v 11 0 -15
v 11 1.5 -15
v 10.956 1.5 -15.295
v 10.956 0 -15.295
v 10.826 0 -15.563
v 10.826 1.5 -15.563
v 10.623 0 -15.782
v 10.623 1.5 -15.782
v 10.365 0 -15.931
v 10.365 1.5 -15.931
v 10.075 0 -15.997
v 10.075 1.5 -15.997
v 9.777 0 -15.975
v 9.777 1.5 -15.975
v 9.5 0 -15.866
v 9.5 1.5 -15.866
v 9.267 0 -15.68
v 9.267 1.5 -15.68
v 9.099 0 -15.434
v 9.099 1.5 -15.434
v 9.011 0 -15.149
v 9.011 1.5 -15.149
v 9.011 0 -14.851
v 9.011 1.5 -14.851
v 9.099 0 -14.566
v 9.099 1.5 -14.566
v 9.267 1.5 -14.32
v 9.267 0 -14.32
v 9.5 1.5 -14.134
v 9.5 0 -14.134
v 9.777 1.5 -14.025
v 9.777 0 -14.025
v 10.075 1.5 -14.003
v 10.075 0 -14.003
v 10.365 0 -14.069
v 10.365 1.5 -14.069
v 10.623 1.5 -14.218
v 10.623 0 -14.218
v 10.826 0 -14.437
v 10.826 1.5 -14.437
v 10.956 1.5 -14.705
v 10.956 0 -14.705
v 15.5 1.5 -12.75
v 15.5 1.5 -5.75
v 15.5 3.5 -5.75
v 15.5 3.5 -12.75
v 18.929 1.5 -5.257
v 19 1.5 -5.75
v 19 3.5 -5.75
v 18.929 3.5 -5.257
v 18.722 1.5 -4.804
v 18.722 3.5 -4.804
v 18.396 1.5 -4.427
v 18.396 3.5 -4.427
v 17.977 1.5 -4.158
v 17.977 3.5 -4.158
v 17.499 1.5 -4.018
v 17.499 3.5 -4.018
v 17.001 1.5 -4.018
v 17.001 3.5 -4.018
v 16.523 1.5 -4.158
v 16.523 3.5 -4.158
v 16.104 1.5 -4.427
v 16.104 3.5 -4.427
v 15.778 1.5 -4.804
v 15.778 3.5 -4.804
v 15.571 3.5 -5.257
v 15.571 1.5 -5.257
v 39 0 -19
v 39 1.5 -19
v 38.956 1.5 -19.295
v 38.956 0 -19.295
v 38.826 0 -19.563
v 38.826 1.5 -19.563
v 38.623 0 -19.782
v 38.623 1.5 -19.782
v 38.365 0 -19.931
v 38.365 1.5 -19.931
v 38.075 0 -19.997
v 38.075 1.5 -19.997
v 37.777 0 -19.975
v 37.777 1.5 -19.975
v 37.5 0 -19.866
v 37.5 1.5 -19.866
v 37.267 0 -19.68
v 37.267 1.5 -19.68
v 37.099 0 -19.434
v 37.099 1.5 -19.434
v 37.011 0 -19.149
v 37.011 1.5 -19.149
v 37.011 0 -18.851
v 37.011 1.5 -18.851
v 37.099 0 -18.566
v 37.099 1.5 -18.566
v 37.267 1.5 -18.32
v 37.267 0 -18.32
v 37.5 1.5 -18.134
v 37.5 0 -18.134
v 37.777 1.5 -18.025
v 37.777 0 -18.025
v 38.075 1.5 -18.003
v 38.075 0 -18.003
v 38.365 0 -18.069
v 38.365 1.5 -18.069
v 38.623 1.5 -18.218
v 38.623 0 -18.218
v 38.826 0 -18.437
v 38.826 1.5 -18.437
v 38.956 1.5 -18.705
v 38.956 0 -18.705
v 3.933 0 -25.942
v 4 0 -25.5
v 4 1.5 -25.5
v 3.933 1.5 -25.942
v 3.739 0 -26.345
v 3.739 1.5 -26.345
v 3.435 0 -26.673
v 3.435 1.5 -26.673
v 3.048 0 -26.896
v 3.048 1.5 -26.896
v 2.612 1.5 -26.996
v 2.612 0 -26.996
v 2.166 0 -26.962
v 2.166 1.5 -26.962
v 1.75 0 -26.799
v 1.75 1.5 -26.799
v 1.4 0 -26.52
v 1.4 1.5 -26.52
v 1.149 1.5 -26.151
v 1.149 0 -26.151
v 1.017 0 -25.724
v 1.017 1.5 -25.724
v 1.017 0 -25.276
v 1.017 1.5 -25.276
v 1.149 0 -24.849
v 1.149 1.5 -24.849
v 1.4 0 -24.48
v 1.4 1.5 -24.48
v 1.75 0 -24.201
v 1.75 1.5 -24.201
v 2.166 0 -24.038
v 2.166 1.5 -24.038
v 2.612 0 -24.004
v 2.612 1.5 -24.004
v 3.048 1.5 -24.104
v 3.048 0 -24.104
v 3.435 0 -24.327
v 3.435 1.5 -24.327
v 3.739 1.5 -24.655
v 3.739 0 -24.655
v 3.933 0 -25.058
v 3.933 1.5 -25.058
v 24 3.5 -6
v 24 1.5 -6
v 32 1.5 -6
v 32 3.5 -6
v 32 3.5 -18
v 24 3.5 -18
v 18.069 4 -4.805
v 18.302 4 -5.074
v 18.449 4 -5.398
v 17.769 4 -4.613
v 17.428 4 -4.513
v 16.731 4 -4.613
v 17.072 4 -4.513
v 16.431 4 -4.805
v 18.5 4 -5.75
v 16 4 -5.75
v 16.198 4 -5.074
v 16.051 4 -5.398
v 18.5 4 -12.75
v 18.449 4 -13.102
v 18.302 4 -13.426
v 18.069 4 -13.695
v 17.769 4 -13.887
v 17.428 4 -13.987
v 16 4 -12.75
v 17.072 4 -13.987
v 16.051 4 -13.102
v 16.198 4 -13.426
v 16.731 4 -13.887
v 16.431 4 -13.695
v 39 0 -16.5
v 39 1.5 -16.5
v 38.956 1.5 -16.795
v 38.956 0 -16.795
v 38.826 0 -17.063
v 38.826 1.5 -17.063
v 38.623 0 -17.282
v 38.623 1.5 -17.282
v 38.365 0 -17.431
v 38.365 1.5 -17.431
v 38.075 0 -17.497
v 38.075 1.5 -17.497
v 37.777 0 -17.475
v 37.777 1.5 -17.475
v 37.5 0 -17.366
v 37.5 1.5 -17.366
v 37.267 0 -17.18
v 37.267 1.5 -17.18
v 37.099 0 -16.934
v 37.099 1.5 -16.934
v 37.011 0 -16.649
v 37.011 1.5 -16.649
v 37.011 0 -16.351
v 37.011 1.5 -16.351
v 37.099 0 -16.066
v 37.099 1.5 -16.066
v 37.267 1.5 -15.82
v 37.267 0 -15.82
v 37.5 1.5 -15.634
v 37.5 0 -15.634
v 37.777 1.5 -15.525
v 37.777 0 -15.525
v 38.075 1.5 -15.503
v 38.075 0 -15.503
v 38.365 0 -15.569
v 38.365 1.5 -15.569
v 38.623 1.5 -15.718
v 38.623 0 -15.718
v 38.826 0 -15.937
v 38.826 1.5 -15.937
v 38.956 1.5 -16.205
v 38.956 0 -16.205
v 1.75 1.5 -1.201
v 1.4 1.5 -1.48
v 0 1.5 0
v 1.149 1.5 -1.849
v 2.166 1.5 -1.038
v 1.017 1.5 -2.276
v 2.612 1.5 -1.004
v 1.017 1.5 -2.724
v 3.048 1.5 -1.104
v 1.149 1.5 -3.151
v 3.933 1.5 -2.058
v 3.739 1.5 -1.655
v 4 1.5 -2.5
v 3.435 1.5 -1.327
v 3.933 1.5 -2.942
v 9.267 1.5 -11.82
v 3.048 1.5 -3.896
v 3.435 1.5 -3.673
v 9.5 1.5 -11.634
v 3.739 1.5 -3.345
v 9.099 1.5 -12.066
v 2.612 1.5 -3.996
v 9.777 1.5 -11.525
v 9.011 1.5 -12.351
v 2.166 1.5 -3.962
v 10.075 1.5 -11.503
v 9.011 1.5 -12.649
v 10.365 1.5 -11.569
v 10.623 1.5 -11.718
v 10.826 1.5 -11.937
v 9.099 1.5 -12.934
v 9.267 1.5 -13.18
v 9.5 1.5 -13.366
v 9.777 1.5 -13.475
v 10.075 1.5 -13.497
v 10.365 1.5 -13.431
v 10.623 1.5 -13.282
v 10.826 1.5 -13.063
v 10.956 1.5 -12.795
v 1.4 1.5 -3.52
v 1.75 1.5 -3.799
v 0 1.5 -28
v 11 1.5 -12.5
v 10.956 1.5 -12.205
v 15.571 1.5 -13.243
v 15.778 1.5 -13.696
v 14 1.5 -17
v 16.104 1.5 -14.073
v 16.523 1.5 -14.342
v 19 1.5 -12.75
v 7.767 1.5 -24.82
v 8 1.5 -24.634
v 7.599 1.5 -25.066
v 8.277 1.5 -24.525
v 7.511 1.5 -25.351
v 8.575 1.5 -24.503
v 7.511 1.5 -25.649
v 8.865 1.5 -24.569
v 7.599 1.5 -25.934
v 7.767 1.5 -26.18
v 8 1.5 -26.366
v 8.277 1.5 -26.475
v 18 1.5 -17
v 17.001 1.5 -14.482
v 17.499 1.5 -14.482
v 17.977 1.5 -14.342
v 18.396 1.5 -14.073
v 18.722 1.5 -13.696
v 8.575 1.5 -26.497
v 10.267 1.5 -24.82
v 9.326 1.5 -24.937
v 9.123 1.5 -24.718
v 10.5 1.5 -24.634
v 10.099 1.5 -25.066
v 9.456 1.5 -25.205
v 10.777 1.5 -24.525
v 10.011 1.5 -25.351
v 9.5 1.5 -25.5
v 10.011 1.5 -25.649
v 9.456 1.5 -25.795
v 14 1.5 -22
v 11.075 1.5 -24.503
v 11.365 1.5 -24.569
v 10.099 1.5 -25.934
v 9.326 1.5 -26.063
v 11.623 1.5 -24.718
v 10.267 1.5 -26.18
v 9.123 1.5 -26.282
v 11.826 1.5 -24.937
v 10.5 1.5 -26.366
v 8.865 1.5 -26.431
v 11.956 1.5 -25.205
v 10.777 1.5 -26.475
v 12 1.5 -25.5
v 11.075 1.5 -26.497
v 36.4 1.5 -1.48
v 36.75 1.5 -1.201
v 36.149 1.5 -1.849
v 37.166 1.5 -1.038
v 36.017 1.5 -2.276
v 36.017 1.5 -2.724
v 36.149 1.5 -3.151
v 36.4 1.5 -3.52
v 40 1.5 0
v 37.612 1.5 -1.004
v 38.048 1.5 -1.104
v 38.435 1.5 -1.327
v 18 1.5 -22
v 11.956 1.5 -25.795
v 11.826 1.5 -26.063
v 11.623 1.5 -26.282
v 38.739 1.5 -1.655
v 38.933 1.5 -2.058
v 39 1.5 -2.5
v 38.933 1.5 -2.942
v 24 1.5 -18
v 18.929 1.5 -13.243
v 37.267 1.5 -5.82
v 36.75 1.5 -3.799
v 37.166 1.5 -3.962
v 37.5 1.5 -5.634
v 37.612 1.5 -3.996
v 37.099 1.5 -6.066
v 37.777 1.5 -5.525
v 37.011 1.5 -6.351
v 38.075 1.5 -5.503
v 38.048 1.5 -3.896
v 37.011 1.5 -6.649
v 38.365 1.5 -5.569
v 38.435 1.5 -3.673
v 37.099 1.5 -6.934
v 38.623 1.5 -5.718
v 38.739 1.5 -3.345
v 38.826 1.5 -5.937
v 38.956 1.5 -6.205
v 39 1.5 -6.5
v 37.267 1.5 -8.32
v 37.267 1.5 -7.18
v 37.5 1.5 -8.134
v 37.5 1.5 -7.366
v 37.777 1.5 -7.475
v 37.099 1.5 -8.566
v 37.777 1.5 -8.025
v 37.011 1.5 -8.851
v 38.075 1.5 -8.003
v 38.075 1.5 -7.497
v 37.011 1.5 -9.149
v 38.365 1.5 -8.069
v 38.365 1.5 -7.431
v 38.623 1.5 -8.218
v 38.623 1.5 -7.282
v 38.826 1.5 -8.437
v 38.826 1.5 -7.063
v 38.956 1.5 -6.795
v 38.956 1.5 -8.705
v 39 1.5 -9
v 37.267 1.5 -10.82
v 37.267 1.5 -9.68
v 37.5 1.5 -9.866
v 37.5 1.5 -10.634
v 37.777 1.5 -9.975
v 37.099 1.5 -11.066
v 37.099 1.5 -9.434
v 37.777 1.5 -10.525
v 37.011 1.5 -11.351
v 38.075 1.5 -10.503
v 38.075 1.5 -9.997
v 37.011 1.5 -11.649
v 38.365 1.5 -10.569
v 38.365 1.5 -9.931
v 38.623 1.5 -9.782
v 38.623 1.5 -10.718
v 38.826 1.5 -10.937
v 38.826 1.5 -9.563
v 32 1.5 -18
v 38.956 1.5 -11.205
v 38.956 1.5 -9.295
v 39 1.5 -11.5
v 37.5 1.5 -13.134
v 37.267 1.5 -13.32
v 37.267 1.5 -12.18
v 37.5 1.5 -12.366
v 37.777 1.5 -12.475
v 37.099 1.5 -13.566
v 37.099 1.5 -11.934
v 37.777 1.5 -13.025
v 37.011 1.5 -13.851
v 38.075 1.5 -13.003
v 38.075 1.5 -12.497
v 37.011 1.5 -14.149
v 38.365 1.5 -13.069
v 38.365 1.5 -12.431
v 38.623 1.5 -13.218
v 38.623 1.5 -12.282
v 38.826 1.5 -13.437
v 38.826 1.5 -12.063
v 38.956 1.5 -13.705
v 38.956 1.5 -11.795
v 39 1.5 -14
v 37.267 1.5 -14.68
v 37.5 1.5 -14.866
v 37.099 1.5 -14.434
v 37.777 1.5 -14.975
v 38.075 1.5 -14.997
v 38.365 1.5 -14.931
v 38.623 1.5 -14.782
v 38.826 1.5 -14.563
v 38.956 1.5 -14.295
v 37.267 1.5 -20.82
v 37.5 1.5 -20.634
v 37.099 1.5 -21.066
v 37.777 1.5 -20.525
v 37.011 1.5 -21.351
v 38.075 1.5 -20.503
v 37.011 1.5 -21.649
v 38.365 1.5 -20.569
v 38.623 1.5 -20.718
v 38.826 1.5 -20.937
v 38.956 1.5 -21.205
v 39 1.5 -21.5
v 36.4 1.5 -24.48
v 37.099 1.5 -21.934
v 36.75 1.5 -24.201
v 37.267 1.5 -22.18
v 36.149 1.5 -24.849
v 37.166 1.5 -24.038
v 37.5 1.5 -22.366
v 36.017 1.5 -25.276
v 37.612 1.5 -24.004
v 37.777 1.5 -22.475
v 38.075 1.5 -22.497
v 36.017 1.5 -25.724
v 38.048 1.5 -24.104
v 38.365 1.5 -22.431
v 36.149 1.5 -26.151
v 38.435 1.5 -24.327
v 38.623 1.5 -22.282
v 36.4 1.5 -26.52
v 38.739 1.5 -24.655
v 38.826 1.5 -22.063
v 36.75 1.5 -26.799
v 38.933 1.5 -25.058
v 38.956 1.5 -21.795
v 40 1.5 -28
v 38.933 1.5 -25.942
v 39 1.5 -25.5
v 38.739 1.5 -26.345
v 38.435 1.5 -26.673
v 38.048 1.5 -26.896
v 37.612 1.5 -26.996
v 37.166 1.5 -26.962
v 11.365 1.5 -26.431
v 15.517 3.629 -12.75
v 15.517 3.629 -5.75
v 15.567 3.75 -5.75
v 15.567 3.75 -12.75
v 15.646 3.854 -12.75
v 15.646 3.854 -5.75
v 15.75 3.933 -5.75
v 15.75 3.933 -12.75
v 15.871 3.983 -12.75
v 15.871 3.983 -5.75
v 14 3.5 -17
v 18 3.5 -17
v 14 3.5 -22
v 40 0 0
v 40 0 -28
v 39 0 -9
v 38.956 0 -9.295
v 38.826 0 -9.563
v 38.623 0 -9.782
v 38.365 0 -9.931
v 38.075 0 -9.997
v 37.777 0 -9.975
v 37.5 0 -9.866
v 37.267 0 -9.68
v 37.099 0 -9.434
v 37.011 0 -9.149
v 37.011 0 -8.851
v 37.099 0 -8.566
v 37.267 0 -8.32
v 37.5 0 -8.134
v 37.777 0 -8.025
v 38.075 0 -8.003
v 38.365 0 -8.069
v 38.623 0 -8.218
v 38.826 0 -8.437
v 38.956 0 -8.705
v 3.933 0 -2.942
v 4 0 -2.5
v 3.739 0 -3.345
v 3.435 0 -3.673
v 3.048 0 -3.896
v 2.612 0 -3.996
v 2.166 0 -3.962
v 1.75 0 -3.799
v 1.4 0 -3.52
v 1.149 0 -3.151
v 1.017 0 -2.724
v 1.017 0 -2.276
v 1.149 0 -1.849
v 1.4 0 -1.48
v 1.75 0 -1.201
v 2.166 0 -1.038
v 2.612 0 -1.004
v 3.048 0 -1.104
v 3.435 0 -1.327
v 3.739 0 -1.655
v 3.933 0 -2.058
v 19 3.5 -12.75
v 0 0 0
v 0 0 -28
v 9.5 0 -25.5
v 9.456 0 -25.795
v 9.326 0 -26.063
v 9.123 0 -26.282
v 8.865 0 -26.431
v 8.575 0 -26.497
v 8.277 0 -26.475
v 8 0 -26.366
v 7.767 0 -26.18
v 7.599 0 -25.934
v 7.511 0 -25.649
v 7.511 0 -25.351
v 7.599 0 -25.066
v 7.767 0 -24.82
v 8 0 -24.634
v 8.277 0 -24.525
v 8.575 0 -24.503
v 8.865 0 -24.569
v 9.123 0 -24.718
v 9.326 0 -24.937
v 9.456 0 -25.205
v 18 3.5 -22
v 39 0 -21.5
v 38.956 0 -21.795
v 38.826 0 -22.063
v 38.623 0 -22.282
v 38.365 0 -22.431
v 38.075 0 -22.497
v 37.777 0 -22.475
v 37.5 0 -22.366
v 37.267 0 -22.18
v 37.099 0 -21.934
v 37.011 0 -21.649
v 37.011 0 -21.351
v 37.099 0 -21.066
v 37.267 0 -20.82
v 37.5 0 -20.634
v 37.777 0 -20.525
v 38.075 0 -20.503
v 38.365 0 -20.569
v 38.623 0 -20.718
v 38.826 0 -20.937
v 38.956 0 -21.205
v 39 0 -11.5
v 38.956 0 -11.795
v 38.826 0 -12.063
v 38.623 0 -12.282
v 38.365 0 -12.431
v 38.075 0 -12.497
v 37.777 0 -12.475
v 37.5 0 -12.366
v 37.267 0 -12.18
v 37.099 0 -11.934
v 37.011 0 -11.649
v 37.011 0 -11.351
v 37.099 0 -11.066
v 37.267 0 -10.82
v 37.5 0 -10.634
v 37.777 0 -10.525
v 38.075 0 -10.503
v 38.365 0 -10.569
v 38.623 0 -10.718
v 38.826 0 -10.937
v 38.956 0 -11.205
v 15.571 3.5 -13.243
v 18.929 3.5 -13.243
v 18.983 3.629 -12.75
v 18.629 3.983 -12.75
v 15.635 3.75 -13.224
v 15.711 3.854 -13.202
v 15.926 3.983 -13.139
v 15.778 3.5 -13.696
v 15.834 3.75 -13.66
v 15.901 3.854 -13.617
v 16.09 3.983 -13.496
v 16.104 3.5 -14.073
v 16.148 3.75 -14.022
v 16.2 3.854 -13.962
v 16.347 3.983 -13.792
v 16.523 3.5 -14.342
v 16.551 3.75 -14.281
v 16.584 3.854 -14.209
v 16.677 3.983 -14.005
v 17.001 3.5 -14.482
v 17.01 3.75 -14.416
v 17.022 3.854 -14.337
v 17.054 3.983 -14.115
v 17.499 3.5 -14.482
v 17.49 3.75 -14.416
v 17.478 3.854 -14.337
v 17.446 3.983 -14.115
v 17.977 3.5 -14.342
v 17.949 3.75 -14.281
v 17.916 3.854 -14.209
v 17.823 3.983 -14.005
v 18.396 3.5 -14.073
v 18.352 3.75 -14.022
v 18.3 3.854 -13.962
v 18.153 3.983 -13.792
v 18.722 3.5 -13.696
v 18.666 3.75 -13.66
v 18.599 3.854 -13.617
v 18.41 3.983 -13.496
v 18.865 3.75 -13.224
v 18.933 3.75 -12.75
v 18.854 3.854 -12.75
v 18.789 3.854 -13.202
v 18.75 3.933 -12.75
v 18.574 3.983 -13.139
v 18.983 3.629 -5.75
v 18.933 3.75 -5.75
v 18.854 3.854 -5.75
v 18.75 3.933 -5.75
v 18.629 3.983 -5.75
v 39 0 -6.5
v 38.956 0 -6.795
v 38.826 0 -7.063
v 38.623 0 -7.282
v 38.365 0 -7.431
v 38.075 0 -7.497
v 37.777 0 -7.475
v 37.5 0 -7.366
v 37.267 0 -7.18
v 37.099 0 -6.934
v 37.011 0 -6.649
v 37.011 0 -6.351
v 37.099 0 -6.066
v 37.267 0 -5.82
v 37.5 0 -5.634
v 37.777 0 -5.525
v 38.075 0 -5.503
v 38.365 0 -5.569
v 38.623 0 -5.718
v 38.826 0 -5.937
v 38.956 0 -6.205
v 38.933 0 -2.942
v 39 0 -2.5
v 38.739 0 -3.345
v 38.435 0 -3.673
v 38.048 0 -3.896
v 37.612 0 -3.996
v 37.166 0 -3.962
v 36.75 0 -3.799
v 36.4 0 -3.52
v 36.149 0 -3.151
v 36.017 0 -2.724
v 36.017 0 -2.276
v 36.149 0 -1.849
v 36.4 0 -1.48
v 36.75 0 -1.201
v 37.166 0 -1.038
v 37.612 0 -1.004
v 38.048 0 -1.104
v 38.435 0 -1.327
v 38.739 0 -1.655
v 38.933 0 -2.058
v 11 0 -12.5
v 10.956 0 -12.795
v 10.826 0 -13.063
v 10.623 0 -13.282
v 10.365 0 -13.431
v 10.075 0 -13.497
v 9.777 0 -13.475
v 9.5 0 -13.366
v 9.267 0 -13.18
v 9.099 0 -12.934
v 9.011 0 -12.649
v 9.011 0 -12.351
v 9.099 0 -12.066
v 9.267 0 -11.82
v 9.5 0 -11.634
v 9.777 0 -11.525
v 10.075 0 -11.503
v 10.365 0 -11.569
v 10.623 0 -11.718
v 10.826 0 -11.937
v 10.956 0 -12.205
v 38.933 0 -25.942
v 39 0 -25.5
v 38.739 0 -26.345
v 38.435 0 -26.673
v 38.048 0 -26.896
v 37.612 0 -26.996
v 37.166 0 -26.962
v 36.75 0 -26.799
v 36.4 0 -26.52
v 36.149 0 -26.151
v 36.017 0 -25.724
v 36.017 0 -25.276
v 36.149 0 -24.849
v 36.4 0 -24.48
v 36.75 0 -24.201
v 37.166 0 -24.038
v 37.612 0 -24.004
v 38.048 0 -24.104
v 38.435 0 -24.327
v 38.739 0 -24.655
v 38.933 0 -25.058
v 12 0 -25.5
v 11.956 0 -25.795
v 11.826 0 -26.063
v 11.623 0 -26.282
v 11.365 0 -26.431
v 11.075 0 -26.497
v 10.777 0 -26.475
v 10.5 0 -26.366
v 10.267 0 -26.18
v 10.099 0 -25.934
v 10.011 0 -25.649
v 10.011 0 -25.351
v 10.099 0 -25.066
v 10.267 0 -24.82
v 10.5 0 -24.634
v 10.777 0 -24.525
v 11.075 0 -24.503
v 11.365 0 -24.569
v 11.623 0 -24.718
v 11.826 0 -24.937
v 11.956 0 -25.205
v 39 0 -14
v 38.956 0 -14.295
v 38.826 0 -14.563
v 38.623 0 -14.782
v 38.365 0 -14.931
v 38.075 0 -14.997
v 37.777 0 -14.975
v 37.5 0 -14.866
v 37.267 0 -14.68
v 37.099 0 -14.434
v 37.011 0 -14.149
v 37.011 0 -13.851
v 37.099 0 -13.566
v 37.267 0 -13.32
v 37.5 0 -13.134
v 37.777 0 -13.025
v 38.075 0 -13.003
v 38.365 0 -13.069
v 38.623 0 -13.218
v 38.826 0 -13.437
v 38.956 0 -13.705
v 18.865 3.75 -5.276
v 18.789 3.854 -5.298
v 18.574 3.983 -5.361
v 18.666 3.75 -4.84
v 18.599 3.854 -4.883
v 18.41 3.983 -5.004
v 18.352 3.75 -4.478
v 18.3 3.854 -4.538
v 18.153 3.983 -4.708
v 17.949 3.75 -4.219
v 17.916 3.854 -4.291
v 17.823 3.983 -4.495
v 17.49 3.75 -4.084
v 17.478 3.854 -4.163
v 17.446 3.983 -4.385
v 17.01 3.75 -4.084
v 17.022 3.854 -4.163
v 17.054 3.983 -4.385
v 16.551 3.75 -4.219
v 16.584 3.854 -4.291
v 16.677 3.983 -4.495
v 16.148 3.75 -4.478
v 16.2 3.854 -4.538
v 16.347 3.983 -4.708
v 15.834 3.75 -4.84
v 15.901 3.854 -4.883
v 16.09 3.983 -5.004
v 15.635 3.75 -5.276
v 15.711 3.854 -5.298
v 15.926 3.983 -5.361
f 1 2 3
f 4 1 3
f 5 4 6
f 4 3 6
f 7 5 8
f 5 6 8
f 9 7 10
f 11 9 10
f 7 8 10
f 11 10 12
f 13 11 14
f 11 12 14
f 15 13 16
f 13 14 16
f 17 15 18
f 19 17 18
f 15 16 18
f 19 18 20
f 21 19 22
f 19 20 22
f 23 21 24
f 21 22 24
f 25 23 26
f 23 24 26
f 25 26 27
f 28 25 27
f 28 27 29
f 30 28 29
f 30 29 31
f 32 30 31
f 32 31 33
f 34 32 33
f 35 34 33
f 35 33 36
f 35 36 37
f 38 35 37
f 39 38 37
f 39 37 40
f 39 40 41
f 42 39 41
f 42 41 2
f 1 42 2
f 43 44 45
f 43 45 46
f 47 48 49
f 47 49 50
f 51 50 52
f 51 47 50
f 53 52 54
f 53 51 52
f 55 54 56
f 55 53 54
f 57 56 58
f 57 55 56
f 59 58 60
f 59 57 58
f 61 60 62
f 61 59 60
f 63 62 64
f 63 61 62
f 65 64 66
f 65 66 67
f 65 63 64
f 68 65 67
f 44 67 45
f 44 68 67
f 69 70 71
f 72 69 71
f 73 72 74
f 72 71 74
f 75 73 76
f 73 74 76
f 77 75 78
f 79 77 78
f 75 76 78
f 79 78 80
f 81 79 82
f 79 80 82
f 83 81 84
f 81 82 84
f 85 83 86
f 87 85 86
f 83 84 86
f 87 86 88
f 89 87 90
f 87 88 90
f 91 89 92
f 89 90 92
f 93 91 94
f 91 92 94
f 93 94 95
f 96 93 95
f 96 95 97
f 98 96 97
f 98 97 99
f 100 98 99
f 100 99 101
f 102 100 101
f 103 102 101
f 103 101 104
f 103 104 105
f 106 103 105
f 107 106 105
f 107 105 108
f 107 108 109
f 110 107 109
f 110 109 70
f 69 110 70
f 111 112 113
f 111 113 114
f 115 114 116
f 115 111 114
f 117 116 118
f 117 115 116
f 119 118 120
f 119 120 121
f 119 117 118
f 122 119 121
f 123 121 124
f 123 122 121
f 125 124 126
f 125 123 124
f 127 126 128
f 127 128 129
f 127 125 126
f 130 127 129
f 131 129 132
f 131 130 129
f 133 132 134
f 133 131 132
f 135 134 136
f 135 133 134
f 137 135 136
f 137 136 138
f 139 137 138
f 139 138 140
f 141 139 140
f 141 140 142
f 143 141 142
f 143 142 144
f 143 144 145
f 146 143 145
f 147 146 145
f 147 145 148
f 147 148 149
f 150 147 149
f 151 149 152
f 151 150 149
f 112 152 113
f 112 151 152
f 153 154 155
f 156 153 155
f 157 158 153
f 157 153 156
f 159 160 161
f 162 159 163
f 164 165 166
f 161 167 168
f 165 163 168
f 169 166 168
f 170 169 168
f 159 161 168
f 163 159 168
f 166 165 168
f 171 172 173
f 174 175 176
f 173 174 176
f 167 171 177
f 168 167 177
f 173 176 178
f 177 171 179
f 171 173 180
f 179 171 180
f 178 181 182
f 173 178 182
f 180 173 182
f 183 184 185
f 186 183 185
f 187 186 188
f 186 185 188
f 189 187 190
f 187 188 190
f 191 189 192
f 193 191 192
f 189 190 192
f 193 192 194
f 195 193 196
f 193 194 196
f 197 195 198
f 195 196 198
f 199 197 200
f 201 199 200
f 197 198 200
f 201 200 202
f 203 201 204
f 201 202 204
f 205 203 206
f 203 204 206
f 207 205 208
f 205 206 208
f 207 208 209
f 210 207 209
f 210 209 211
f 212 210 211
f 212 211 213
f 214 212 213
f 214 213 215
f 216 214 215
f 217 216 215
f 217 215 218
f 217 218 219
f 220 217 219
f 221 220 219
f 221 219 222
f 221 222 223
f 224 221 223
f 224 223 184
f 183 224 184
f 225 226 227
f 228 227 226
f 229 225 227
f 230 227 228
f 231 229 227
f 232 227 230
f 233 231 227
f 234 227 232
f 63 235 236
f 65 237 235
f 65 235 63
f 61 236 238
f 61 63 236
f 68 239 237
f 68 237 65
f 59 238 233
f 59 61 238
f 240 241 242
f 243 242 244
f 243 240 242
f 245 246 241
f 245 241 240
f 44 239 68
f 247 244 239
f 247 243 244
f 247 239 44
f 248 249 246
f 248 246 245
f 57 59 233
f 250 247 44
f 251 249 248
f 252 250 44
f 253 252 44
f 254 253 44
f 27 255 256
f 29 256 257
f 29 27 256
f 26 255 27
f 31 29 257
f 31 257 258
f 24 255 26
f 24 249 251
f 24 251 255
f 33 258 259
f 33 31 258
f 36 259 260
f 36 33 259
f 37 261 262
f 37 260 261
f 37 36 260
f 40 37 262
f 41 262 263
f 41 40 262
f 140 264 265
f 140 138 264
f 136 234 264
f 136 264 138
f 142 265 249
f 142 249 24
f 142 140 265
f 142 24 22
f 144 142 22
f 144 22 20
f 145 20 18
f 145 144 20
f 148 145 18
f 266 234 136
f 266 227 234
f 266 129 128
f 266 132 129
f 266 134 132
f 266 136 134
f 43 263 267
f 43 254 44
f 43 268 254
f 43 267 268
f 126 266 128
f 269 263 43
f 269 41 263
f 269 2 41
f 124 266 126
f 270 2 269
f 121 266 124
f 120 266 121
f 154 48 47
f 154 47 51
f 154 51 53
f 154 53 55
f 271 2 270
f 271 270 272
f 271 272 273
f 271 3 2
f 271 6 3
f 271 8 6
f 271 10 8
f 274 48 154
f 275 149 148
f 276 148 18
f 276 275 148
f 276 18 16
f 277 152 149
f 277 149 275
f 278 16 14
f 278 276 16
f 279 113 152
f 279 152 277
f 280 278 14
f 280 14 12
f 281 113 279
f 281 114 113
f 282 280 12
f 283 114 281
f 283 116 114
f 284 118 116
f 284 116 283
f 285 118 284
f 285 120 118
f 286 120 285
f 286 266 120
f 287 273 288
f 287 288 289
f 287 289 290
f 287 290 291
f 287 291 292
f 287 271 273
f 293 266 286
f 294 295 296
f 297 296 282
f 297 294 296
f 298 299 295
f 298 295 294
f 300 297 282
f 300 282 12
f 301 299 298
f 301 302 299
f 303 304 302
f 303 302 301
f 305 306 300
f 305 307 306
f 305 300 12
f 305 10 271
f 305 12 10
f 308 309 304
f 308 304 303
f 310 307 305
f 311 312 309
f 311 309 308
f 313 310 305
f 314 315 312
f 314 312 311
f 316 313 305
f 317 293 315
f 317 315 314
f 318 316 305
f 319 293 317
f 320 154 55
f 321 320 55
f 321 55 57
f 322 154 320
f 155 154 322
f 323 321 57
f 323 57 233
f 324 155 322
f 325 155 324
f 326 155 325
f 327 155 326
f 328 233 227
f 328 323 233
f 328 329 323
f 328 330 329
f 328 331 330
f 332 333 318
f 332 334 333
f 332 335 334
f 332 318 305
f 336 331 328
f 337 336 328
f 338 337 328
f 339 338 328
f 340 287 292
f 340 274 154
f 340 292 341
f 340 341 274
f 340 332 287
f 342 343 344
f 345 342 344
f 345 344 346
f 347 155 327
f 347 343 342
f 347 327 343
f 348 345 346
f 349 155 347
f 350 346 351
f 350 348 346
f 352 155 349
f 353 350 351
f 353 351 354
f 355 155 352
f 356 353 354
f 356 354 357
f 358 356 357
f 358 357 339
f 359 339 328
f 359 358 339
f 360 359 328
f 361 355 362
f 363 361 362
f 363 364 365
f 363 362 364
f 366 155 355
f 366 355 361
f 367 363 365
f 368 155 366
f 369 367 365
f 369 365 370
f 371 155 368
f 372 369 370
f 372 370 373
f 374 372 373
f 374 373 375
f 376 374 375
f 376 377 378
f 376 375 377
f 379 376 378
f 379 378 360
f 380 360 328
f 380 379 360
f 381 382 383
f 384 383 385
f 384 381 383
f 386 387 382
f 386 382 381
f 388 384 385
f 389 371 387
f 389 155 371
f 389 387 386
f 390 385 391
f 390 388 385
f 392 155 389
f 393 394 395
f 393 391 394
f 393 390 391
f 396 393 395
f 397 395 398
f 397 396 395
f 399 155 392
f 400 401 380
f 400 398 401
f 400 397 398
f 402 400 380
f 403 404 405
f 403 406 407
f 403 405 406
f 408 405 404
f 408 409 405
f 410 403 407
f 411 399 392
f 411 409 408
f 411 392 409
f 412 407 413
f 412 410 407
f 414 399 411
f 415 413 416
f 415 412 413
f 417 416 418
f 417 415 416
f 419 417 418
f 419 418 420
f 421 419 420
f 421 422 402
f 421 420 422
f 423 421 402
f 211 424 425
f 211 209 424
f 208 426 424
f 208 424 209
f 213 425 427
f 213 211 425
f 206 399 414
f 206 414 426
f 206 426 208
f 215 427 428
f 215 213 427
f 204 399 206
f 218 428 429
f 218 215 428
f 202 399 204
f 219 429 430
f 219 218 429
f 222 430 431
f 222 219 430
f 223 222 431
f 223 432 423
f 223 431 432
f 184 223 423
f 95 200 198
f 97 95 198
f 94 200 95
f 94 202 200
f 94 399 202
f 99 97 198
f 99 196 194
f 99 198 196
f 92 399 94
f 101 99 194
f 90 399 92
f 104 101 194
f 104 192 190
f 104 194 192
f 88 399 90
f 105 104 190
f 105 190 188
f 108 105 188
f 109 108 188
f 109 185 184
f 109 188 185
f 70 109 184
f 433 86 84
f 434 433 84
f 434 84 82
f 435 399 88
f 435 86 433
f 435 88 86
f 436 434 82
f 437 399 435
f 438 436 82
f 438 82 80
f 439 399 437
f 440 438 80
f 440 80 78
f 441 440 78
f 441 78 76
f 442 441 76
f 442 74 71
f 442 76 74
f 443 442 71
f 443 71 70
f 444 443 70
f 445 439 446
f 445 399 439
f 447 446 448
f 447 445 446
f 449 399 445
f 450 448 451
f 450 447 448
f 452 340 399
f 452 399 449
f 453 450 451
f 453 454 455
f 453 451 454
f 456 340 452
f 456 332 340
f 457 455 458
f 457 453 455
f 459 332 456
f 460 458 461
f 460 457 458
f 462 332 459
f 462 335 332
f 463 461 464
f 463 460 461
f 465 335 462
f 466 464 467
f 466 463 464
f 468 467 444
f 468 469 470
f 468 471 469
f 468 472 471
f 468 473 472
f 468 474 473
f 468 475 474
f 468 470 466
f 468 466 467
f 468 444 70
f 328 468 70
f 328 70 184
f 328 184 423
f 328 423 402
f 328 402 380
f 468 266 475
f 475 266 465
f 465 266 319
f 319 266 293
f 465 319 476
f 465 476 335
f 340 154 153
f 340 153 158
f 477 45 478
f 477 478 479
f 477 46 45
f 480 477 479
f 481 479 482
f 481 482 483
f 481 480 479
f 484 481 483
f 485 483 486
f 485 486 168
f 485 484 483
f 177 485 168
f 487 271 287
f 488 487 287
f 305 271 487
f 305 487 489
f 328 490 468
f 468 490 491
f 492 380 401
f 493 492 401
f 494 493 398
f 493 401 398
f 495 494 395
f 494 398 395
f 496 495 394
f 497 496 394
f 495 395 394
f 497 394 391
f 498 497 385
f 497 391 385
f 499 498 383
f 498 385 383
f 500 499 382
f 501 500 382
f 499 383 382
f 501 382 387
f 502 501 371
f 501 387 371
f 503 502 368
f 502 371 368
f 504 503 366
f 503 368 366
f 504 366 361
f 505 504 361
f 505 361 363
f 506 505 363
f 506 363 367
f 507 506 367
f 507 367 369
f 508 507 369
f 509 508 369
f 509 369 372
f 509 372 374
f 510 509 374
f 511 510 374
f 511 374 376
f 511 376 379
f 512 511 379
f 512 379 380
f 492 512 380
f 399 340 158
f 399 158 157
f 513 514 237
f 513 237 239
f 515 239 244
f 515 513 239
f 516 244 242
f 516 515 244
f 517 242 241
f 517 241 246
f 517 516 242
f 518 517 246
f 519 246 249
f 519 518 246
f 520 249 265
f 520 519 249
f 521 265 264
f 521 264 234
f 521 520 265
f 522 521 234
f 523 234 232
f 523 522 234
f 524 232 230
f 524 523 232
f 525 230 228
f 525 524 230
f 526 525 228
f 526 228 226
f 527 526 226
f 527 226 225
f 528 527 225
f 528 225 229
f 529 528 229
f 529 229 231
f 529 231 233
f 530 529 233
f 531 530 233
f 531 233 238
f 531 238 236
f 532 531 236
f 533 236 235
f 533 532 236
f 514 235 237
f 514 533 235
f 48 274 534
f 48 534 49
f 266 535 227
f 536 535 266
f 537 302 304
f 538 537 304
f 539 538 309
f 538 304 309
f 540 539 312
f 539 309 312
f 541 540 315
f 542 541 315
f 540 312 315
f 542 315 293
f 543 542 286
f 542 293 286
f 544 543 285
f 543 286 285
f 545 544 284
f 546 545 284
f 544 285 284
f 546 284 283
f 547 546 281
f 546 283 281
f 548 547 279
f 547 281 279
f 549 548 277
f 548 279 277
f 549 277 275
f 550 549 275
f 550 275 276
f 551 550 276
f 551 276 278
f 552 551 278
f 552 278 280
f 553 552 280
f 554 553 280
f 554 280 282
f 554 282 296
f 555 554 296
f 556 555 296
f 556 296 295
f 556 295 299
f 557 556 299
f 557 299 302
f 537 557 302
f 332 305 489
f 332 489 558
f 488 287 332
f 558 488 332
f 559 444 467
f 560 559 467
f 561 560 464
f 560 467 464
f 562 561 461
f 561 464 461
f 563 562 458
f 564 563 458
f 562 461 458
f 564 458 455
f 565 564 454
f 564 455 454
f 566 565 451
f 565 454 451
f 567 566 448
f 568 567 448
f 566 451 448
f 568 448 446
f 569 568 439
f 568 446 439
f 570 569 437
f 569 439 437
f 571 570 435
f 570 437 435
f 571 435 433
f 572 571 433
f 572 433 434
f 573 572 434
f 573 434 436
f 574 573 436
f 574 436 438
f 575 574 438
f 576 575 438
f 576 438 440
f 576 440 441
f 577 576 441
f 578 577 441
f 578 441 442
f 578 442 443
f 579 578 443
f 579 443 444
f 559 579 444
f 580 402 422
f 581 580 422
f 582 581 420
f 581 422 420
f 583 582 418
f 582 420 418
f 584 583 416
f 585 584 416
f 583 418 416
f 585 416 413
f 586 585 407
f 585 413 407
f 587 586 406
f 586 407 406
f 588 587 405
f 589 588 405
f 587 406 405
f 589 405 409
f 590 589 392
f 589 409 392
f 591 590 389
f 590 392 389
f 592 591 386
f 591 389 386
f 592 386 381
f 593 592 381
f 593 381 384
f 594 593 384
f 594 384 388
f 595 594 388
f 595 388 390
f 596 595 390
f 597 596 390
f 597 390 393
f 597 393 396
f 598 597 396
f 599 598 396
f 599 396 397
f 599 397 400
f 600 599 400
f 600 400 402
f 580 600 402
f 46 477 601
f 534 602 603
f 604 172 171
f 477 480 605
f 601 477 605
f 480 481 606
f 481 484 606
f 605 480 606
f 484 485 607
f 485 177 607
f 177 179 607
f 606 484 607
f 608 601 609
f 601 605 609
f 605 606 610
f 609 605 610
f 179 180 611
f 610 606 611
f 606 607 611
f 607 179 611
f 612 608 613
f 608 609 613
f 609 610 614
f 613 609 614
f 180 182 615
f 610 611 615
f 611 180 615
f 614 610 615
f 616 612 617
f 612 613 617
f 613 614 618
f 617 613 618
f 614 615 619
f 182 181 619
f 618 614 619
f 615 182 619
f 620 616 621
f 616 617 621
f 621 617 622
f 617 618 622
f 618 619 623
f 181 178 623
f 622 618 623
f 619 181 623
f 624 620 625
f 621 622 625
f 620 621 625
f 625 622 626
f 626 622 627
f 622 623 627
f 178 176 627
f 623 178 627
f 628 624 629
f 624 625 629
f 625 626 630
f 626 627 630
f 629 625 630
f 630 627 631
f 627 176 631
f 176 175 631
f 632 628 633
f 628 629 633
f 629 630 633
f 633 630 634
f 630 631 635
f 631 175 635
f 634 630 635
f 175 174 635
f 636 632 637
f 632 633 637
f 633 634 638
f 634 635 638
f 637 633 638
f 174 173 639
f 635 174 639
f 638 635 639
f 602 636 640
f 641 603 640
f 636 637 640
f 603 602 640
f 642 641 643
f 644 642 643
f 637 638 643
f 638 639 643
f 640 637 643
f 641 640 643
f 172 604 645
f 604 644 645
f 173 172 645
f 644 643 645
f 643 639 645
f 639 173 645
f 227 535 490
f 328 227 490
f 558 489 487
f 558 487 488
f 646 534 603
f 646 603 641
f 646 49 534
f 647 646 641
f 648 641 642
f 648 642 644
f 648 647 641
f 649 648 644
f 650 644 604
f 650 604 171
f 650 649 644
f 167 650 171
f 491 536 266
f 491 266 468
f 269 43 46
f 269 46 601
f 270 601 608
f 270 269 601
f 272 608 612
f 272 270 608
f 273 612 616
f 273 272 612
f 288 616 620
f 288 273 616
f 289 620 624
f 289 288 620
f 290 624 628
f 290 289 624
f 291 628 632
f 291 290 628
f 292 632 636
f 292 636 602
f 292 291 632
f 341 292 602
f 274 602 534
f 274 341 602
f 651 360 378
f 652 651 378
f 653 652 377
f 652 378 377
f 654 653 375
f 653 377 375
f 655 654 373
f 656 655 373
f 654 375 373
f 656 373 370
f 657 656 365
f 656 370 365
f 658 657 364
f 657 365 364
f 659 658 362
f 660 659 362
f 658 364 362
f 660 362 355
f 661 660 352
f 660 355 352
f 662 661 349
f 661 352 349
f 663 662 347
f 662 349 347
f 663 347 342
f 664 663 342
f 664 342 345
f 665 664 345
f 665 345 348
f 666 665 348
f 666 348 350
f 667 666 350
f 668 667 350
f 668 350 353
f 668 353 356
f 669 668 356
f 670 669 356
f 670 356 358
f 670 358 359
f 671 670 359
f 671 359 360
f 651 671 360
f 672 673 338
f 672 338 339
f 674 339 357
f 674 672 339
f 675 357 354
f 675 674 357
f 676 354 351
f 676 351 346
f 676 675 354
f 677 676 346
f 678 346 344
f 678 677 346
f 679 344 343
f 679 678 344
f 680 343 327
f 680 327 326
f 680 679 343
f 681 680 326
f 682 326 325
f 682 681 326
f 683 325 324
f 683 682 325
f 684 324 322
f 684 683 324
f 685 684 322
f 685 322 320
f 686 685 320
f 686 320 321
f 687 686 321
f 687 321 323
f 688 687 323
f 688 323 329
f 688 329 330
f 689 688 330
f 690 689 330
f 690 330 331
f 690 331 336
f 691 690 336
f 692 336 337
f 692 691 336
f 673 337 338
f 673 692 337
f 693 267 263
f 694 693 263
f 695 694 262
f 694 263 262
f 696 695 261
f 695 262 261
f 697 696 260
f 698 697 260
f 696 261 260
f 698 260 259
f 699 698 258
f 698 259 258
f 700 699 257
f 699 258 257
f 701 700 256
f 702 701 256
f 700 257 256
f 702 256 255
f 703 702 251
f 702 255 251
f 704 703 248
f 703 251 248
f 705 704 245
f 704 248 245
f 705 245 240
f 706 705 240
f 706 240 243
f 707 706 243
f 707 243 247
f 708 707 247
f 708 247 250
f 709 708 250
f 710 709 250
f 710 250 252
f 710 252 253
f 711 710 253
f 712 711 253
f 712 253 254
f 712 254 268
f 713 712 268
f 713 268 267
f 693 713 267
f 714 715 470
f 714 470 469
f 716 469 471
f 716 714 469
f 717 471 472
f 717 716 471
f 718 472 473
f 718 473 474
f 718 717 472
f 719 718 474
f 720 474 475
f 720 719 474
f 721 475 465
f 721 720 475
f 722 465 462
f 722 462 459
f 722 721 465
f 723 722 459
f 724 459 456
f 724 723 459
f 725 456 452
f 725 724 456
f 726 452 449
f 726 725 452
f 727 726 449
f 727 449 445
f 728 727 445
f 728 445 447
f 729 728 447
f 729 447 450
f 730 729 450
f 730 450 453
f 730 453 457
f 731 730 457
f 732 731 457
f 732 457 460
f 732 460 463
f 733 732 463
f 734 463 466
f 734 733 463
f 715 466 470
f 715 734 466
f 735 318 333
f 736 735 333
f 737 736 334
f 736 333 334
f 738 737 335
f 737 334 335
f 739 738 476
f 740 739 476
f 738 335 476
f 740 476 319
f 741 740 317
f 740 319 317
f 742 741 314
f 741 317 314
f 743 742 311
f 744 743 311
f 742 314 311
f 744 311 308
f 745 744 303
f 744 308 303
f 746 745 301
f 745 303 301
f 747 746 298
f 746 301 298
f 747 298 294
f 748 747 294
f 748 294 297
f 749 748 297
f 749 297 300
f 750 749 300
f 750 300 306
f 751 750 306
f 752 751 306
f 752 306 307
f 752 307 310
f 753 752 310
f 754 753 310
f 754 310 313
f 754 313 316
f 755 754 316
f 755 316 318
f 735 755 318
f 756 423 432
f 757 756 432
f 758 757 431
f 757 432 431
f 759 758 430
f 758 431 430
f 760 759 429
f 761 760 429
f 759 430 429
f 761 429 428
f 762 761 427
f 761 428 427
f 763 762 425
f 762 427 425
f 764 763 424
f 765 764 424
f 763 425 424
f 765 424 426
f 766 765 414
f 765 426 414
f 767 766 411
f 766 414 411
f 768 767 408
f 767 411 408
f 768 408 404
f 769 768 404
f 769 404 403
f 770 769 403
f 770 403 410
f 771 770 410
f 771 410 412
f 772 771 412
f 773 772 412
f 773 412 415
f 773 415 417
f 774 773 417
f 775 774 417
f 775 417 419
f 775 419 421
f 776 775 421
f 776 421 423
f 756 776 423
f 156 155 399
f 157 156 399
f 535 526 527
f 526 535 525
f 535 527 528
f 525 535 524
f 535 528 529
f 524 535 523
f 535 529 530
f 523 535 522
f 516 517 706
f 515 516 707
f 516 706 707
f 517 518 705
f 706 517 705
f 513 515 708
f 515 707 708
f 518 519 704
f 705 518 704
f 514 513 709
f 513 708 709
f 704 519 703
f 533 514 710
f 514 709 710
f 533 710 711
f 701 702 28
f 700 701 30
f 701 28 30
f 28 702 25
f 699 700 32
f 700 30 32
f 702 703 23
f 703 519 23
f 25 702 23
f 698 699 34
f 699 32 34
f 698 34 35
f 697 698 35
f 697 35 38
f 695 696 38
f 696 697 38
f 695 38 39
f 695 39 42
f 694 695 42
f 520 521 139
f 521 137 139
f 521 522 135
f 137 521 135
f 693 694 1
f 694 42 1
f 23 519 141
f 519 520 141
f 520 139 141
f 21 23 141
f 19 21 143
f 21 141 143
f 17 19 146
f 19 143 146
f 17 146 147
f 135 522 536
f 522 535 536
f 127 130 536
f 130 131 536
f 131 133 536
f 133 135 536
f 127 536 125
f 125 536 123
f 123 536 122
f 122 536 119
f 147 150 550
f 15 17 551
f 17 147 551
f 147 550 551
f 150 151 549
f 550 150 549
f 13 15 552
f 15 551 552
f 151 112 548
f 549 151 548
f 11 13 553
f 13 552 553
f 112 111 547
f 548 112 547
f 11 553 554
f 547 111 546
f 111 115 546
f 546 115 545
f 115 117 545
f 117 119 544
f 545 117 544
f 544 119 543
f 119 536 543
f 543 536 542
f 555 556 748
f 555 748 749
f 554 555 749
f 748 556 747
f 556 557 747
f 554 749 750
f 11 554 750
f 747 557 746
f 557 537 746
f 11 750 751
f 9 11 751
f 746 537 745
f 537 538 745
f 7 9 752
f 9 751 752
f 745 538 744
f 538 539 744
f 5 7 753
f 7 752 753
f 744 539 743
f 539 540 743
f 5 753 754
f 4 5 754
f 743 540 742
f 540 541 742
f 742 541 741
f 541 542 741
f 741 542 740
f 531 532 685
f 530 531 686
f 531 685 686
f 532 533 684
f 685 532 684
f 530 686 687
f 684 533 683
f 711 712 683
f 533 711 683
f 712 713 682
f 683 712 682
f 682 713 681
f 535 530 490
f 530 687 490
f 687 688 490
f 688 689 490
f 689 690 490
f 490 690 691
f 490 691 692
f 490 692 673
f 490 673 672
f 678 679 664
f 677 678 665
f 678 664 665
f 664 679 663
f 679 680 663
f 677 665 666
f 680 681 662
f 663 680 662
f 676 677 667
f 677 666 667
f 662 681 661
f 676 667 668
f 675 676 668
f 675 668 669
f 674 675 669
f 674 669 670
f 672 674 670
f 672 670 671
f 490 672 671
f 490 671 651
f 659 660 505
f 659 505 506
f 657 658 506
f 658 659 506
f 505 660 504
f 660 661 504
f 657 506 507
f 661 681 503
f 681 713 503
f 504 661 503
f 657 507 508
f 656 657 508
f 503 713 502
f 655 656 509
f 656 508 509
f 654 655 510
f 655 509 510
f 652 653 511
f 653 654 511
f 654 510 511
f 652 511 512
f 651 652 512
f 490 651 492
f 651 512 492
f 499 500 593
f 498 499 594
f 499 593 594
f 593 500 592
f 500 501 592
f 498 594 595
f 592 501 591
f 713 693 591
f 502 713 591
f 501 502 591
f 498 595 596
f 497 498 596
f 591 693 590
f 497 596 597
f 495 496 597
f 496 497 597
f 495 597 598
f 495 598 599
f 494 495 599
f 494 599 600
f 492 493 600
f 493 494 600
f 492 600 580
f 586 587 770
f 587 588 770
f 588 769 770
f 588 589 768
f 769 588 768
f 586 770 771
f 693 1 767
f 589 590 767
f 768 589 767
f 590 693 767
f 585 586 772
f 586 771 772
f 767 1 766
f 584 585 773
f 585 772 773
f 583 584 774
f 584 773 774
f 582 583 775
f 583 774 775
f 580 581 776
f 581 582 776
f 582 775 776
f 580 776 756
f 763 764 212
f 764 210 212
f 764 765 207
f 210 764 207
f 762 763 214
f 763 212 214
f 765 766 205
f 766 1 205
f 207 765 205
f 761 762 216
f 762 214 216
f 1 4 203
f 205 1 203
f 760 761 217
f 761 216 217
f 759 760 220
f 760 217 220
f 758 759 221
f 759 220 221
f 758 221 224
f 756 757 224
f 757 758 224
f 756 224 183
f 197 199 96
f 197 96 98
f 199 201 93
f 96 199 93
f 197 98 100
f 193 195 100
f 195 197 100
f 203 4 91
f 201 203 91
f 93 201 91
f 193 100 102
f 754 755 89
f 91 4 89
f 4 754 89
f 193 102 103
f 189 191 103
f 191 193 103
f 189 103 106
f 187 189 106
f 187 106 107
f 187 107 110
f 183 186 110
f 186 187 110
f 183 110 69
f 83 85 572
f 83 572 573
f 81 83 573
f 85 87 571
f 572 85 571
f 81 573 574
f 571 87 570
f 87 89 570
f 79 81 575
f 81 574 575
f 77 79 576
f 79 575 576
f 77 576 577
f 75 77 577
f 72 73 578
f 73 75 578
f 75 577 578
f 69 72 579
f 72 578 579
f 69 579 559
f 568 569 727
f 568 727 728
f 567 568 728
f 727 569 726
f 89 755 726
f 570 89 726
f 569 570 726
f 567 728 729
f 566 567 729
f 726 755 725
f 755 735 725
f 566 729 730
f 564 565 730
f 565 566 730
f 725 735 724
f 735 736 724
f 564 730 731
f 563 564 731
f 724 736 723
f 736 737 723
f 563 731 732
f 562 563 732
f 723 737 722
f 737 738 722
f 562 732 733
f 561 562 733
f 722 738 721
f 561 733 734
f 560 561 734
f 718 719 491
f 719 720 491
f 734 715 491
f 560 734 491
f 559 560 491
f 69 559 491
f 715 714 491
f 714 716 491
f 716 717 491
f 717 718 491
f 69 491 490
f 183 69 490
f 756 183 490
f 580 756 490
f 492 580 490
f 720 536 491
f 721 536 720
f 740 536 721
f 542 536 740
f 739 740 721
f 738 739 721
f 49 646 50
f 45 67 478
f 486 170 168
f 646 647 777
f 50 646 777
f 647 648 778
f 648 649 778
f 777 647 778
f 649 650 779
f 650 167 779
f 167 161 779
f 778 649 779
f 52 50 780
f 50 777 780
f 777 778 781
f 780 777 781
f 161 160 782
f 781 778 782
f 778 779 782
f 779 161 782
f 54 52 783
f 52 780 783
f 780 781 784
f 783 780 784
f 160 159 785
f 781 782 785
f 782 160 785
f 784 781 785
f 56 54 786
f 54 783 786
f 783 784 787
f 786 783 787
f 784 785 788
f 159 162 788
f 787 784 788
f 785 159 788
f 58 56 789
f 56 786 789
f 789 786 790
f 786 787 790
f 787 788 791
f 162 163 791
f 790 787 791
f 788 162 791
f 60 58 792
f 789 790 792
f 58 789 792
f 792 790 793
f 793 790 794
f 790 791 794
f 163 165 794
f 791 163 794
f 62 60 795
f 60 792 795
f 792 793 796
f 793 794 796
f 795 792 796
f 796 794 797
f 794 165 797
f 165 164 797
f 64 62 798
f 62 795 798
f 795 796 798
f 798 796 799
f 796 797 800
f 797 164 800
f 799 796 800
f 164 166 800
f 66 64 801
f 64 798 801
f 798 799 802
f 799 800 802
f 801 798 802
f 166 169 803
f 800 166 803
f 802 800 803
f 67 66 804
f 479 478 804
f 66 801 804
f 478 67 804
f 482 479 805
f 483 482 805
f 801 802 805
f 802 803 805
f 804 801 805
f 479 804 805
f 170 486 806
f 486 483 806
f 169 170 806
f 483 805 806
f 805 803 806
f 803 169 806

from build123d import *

# Parameters (mm, degrees)
SKETCH1_W           = 40
SKETCH1_H           = 28
SKETCH1_R           = 1.5
BOSS_EXTRUDE1_DEPTH = 1.5
SKETCH2_R           = 1
CUT_EXTRUDE1_DEPTH  = 2.5
SKETCH3_W           = 8
SKETCH3_H           = 12
BOSS_EXTRUDE2_DEPTH = 2
SKETCH4_W           = 4
SKETCH4_H           = 5
BOSS_EXTRUDE3_DEPTH = 2
SKETCH5_R           = 1
CUT_EXTRUDE2_DEPTH  = 2.5
BOSS_EXTRUDE4_DEPTH = 2.5
FILLET1_R           = 0.5


with BuildPart() as part:
    # Sketch1 → Boss-Extrude1 (new body)
    with BuildSketch(Plane(origin=(0, 0, 0), x_dir=(1, 0, 0), z_dir=(0, 1, 0))):
        with Locations((20, 14)):
            Rectangle(SKETCH1_W, SKETCH1_H)
        with Locations((2.5, 25.5)):
            Circle(SKETCH1_R, mode=Mode.SUBTRACT)
        with Locations((2.5, 2.5)):
            Circle(SKETCH1_R, mode=Mode.SUBTRACT)
        with Locations((37.5, 25.5)):
            Circle(SKETCH1_R, mode=Mode.SUBTRACT)
        with Locations((37.5, 2.5)):
            Circle(SKETCH1_R, mode=Mode.SUBTRACT)
    extrude(amount=BOSS_EXTRUDE1_DEPTH)

    # Sketch2 → Cut-Extrude1 (cut, through all)
    with BuildSketch(Plane(origin=(0, 1.5, 0), x_dir=(1, 0, 0), z_dir=(0, 1, 0))):
        with Locations((38, 6.5)):
            Circle(SKETCH2_R)
        with Locations((38, 9)):
            Circle(SKETCH2_R)
        with Locations((38, 11.5)):
            Circle(SKETCH2_R)
        with Locations((38, 14)):
            Circle(SKETCH2_R)
        with Locations((38, 16.5)):
            Circle(SKETCH2_R)
        with Locations((38, 19)):
            Circle(SKETCH2_R)
        with Locations((38, 21.5)):
            Circle(SKETCH2_R)
    extrude(amount=-CUT_EXTRUDE1_DEPTH, mode=Mode.SUBTRACT)

    # Sketch3 → Boss-Extrude2 (add)
    with BuildSketch(Plane(origin=(0, 1.5, 0), x_dir=(1, 0, 0), z_dir=(0, 1, 0))):
        with Locations((28, 12)):
            Rectangle(SKETCH3_W, SKETCH3_H)
    extrude(amount=BOSS_EXTRUDE2_DEPTH)

    # Sketch4 → Boss-Extrude3 (add)
    with BuildSketch(Plane(origin=(0, 1.5, 0), x_dir=(1, 0, 0), z_dir=(0, 1, 0))):
        with Locations((16, 19.5)):
            Rectangle(SKETCH4_W, SKETCH4_H)
    extrude(amount=BOSS_EXTRUDE3_DEPTH)

    # Sketch5 → Cut-Extrude2 (cut, through all)
    with BuildSketch(Plane(origin=(0, 1.5, 0), x_dir=(1, 0, 0), z_dir=(0, 1, 0))):
        with Locations((10, 15)):
            Circle(SKETCH5_R)
        with Locations((10, 12.5)):
            Circle(SKETCH5_R)
        with Locations((8.5, 25.5)):
            Circle(SKETCH5_R)
        with Locations((11, 25.5)):
            Circle(SKETCH5_R)
    extrude(amount=-CUT_EXTRUDE2_DEPTH, mode=Mode.SUBTRACT)

    # Sketch6 → Boss-Extrude4 (add)
    with BuildSketch(Plane(origin=(0, 1.5, 0), x_dir=(1, 0, 0), z_dir=(0, 1, 0))):
        with BuildLine():
            Line((19, 12.75), (19, 5.75))
            ThreePointArc((19, 5.75), (17.25, 4), (15.5, 5.75))
            Line((15.5, 5.75), (15.5, 12.75))
            ThreePointArc((15.5, 12.75), (17.25, 14.5), (19, 12.75))
        make_face()
    extrude(amount=BOSS_EXTRUDE4_DEPTH)

    # Fillet1
    fillet1_edges = [part.edges().sort_by_distance(p)[0] for p in [
        (17.25, 4, -14.5),
        (15.5, 4, -9.25),
        (17.25, 4, -4),
        (19, 4, -9.25),
    ]]
    fillet(fillet1_edges, radius=FILLET1_R)


solid = part.part
